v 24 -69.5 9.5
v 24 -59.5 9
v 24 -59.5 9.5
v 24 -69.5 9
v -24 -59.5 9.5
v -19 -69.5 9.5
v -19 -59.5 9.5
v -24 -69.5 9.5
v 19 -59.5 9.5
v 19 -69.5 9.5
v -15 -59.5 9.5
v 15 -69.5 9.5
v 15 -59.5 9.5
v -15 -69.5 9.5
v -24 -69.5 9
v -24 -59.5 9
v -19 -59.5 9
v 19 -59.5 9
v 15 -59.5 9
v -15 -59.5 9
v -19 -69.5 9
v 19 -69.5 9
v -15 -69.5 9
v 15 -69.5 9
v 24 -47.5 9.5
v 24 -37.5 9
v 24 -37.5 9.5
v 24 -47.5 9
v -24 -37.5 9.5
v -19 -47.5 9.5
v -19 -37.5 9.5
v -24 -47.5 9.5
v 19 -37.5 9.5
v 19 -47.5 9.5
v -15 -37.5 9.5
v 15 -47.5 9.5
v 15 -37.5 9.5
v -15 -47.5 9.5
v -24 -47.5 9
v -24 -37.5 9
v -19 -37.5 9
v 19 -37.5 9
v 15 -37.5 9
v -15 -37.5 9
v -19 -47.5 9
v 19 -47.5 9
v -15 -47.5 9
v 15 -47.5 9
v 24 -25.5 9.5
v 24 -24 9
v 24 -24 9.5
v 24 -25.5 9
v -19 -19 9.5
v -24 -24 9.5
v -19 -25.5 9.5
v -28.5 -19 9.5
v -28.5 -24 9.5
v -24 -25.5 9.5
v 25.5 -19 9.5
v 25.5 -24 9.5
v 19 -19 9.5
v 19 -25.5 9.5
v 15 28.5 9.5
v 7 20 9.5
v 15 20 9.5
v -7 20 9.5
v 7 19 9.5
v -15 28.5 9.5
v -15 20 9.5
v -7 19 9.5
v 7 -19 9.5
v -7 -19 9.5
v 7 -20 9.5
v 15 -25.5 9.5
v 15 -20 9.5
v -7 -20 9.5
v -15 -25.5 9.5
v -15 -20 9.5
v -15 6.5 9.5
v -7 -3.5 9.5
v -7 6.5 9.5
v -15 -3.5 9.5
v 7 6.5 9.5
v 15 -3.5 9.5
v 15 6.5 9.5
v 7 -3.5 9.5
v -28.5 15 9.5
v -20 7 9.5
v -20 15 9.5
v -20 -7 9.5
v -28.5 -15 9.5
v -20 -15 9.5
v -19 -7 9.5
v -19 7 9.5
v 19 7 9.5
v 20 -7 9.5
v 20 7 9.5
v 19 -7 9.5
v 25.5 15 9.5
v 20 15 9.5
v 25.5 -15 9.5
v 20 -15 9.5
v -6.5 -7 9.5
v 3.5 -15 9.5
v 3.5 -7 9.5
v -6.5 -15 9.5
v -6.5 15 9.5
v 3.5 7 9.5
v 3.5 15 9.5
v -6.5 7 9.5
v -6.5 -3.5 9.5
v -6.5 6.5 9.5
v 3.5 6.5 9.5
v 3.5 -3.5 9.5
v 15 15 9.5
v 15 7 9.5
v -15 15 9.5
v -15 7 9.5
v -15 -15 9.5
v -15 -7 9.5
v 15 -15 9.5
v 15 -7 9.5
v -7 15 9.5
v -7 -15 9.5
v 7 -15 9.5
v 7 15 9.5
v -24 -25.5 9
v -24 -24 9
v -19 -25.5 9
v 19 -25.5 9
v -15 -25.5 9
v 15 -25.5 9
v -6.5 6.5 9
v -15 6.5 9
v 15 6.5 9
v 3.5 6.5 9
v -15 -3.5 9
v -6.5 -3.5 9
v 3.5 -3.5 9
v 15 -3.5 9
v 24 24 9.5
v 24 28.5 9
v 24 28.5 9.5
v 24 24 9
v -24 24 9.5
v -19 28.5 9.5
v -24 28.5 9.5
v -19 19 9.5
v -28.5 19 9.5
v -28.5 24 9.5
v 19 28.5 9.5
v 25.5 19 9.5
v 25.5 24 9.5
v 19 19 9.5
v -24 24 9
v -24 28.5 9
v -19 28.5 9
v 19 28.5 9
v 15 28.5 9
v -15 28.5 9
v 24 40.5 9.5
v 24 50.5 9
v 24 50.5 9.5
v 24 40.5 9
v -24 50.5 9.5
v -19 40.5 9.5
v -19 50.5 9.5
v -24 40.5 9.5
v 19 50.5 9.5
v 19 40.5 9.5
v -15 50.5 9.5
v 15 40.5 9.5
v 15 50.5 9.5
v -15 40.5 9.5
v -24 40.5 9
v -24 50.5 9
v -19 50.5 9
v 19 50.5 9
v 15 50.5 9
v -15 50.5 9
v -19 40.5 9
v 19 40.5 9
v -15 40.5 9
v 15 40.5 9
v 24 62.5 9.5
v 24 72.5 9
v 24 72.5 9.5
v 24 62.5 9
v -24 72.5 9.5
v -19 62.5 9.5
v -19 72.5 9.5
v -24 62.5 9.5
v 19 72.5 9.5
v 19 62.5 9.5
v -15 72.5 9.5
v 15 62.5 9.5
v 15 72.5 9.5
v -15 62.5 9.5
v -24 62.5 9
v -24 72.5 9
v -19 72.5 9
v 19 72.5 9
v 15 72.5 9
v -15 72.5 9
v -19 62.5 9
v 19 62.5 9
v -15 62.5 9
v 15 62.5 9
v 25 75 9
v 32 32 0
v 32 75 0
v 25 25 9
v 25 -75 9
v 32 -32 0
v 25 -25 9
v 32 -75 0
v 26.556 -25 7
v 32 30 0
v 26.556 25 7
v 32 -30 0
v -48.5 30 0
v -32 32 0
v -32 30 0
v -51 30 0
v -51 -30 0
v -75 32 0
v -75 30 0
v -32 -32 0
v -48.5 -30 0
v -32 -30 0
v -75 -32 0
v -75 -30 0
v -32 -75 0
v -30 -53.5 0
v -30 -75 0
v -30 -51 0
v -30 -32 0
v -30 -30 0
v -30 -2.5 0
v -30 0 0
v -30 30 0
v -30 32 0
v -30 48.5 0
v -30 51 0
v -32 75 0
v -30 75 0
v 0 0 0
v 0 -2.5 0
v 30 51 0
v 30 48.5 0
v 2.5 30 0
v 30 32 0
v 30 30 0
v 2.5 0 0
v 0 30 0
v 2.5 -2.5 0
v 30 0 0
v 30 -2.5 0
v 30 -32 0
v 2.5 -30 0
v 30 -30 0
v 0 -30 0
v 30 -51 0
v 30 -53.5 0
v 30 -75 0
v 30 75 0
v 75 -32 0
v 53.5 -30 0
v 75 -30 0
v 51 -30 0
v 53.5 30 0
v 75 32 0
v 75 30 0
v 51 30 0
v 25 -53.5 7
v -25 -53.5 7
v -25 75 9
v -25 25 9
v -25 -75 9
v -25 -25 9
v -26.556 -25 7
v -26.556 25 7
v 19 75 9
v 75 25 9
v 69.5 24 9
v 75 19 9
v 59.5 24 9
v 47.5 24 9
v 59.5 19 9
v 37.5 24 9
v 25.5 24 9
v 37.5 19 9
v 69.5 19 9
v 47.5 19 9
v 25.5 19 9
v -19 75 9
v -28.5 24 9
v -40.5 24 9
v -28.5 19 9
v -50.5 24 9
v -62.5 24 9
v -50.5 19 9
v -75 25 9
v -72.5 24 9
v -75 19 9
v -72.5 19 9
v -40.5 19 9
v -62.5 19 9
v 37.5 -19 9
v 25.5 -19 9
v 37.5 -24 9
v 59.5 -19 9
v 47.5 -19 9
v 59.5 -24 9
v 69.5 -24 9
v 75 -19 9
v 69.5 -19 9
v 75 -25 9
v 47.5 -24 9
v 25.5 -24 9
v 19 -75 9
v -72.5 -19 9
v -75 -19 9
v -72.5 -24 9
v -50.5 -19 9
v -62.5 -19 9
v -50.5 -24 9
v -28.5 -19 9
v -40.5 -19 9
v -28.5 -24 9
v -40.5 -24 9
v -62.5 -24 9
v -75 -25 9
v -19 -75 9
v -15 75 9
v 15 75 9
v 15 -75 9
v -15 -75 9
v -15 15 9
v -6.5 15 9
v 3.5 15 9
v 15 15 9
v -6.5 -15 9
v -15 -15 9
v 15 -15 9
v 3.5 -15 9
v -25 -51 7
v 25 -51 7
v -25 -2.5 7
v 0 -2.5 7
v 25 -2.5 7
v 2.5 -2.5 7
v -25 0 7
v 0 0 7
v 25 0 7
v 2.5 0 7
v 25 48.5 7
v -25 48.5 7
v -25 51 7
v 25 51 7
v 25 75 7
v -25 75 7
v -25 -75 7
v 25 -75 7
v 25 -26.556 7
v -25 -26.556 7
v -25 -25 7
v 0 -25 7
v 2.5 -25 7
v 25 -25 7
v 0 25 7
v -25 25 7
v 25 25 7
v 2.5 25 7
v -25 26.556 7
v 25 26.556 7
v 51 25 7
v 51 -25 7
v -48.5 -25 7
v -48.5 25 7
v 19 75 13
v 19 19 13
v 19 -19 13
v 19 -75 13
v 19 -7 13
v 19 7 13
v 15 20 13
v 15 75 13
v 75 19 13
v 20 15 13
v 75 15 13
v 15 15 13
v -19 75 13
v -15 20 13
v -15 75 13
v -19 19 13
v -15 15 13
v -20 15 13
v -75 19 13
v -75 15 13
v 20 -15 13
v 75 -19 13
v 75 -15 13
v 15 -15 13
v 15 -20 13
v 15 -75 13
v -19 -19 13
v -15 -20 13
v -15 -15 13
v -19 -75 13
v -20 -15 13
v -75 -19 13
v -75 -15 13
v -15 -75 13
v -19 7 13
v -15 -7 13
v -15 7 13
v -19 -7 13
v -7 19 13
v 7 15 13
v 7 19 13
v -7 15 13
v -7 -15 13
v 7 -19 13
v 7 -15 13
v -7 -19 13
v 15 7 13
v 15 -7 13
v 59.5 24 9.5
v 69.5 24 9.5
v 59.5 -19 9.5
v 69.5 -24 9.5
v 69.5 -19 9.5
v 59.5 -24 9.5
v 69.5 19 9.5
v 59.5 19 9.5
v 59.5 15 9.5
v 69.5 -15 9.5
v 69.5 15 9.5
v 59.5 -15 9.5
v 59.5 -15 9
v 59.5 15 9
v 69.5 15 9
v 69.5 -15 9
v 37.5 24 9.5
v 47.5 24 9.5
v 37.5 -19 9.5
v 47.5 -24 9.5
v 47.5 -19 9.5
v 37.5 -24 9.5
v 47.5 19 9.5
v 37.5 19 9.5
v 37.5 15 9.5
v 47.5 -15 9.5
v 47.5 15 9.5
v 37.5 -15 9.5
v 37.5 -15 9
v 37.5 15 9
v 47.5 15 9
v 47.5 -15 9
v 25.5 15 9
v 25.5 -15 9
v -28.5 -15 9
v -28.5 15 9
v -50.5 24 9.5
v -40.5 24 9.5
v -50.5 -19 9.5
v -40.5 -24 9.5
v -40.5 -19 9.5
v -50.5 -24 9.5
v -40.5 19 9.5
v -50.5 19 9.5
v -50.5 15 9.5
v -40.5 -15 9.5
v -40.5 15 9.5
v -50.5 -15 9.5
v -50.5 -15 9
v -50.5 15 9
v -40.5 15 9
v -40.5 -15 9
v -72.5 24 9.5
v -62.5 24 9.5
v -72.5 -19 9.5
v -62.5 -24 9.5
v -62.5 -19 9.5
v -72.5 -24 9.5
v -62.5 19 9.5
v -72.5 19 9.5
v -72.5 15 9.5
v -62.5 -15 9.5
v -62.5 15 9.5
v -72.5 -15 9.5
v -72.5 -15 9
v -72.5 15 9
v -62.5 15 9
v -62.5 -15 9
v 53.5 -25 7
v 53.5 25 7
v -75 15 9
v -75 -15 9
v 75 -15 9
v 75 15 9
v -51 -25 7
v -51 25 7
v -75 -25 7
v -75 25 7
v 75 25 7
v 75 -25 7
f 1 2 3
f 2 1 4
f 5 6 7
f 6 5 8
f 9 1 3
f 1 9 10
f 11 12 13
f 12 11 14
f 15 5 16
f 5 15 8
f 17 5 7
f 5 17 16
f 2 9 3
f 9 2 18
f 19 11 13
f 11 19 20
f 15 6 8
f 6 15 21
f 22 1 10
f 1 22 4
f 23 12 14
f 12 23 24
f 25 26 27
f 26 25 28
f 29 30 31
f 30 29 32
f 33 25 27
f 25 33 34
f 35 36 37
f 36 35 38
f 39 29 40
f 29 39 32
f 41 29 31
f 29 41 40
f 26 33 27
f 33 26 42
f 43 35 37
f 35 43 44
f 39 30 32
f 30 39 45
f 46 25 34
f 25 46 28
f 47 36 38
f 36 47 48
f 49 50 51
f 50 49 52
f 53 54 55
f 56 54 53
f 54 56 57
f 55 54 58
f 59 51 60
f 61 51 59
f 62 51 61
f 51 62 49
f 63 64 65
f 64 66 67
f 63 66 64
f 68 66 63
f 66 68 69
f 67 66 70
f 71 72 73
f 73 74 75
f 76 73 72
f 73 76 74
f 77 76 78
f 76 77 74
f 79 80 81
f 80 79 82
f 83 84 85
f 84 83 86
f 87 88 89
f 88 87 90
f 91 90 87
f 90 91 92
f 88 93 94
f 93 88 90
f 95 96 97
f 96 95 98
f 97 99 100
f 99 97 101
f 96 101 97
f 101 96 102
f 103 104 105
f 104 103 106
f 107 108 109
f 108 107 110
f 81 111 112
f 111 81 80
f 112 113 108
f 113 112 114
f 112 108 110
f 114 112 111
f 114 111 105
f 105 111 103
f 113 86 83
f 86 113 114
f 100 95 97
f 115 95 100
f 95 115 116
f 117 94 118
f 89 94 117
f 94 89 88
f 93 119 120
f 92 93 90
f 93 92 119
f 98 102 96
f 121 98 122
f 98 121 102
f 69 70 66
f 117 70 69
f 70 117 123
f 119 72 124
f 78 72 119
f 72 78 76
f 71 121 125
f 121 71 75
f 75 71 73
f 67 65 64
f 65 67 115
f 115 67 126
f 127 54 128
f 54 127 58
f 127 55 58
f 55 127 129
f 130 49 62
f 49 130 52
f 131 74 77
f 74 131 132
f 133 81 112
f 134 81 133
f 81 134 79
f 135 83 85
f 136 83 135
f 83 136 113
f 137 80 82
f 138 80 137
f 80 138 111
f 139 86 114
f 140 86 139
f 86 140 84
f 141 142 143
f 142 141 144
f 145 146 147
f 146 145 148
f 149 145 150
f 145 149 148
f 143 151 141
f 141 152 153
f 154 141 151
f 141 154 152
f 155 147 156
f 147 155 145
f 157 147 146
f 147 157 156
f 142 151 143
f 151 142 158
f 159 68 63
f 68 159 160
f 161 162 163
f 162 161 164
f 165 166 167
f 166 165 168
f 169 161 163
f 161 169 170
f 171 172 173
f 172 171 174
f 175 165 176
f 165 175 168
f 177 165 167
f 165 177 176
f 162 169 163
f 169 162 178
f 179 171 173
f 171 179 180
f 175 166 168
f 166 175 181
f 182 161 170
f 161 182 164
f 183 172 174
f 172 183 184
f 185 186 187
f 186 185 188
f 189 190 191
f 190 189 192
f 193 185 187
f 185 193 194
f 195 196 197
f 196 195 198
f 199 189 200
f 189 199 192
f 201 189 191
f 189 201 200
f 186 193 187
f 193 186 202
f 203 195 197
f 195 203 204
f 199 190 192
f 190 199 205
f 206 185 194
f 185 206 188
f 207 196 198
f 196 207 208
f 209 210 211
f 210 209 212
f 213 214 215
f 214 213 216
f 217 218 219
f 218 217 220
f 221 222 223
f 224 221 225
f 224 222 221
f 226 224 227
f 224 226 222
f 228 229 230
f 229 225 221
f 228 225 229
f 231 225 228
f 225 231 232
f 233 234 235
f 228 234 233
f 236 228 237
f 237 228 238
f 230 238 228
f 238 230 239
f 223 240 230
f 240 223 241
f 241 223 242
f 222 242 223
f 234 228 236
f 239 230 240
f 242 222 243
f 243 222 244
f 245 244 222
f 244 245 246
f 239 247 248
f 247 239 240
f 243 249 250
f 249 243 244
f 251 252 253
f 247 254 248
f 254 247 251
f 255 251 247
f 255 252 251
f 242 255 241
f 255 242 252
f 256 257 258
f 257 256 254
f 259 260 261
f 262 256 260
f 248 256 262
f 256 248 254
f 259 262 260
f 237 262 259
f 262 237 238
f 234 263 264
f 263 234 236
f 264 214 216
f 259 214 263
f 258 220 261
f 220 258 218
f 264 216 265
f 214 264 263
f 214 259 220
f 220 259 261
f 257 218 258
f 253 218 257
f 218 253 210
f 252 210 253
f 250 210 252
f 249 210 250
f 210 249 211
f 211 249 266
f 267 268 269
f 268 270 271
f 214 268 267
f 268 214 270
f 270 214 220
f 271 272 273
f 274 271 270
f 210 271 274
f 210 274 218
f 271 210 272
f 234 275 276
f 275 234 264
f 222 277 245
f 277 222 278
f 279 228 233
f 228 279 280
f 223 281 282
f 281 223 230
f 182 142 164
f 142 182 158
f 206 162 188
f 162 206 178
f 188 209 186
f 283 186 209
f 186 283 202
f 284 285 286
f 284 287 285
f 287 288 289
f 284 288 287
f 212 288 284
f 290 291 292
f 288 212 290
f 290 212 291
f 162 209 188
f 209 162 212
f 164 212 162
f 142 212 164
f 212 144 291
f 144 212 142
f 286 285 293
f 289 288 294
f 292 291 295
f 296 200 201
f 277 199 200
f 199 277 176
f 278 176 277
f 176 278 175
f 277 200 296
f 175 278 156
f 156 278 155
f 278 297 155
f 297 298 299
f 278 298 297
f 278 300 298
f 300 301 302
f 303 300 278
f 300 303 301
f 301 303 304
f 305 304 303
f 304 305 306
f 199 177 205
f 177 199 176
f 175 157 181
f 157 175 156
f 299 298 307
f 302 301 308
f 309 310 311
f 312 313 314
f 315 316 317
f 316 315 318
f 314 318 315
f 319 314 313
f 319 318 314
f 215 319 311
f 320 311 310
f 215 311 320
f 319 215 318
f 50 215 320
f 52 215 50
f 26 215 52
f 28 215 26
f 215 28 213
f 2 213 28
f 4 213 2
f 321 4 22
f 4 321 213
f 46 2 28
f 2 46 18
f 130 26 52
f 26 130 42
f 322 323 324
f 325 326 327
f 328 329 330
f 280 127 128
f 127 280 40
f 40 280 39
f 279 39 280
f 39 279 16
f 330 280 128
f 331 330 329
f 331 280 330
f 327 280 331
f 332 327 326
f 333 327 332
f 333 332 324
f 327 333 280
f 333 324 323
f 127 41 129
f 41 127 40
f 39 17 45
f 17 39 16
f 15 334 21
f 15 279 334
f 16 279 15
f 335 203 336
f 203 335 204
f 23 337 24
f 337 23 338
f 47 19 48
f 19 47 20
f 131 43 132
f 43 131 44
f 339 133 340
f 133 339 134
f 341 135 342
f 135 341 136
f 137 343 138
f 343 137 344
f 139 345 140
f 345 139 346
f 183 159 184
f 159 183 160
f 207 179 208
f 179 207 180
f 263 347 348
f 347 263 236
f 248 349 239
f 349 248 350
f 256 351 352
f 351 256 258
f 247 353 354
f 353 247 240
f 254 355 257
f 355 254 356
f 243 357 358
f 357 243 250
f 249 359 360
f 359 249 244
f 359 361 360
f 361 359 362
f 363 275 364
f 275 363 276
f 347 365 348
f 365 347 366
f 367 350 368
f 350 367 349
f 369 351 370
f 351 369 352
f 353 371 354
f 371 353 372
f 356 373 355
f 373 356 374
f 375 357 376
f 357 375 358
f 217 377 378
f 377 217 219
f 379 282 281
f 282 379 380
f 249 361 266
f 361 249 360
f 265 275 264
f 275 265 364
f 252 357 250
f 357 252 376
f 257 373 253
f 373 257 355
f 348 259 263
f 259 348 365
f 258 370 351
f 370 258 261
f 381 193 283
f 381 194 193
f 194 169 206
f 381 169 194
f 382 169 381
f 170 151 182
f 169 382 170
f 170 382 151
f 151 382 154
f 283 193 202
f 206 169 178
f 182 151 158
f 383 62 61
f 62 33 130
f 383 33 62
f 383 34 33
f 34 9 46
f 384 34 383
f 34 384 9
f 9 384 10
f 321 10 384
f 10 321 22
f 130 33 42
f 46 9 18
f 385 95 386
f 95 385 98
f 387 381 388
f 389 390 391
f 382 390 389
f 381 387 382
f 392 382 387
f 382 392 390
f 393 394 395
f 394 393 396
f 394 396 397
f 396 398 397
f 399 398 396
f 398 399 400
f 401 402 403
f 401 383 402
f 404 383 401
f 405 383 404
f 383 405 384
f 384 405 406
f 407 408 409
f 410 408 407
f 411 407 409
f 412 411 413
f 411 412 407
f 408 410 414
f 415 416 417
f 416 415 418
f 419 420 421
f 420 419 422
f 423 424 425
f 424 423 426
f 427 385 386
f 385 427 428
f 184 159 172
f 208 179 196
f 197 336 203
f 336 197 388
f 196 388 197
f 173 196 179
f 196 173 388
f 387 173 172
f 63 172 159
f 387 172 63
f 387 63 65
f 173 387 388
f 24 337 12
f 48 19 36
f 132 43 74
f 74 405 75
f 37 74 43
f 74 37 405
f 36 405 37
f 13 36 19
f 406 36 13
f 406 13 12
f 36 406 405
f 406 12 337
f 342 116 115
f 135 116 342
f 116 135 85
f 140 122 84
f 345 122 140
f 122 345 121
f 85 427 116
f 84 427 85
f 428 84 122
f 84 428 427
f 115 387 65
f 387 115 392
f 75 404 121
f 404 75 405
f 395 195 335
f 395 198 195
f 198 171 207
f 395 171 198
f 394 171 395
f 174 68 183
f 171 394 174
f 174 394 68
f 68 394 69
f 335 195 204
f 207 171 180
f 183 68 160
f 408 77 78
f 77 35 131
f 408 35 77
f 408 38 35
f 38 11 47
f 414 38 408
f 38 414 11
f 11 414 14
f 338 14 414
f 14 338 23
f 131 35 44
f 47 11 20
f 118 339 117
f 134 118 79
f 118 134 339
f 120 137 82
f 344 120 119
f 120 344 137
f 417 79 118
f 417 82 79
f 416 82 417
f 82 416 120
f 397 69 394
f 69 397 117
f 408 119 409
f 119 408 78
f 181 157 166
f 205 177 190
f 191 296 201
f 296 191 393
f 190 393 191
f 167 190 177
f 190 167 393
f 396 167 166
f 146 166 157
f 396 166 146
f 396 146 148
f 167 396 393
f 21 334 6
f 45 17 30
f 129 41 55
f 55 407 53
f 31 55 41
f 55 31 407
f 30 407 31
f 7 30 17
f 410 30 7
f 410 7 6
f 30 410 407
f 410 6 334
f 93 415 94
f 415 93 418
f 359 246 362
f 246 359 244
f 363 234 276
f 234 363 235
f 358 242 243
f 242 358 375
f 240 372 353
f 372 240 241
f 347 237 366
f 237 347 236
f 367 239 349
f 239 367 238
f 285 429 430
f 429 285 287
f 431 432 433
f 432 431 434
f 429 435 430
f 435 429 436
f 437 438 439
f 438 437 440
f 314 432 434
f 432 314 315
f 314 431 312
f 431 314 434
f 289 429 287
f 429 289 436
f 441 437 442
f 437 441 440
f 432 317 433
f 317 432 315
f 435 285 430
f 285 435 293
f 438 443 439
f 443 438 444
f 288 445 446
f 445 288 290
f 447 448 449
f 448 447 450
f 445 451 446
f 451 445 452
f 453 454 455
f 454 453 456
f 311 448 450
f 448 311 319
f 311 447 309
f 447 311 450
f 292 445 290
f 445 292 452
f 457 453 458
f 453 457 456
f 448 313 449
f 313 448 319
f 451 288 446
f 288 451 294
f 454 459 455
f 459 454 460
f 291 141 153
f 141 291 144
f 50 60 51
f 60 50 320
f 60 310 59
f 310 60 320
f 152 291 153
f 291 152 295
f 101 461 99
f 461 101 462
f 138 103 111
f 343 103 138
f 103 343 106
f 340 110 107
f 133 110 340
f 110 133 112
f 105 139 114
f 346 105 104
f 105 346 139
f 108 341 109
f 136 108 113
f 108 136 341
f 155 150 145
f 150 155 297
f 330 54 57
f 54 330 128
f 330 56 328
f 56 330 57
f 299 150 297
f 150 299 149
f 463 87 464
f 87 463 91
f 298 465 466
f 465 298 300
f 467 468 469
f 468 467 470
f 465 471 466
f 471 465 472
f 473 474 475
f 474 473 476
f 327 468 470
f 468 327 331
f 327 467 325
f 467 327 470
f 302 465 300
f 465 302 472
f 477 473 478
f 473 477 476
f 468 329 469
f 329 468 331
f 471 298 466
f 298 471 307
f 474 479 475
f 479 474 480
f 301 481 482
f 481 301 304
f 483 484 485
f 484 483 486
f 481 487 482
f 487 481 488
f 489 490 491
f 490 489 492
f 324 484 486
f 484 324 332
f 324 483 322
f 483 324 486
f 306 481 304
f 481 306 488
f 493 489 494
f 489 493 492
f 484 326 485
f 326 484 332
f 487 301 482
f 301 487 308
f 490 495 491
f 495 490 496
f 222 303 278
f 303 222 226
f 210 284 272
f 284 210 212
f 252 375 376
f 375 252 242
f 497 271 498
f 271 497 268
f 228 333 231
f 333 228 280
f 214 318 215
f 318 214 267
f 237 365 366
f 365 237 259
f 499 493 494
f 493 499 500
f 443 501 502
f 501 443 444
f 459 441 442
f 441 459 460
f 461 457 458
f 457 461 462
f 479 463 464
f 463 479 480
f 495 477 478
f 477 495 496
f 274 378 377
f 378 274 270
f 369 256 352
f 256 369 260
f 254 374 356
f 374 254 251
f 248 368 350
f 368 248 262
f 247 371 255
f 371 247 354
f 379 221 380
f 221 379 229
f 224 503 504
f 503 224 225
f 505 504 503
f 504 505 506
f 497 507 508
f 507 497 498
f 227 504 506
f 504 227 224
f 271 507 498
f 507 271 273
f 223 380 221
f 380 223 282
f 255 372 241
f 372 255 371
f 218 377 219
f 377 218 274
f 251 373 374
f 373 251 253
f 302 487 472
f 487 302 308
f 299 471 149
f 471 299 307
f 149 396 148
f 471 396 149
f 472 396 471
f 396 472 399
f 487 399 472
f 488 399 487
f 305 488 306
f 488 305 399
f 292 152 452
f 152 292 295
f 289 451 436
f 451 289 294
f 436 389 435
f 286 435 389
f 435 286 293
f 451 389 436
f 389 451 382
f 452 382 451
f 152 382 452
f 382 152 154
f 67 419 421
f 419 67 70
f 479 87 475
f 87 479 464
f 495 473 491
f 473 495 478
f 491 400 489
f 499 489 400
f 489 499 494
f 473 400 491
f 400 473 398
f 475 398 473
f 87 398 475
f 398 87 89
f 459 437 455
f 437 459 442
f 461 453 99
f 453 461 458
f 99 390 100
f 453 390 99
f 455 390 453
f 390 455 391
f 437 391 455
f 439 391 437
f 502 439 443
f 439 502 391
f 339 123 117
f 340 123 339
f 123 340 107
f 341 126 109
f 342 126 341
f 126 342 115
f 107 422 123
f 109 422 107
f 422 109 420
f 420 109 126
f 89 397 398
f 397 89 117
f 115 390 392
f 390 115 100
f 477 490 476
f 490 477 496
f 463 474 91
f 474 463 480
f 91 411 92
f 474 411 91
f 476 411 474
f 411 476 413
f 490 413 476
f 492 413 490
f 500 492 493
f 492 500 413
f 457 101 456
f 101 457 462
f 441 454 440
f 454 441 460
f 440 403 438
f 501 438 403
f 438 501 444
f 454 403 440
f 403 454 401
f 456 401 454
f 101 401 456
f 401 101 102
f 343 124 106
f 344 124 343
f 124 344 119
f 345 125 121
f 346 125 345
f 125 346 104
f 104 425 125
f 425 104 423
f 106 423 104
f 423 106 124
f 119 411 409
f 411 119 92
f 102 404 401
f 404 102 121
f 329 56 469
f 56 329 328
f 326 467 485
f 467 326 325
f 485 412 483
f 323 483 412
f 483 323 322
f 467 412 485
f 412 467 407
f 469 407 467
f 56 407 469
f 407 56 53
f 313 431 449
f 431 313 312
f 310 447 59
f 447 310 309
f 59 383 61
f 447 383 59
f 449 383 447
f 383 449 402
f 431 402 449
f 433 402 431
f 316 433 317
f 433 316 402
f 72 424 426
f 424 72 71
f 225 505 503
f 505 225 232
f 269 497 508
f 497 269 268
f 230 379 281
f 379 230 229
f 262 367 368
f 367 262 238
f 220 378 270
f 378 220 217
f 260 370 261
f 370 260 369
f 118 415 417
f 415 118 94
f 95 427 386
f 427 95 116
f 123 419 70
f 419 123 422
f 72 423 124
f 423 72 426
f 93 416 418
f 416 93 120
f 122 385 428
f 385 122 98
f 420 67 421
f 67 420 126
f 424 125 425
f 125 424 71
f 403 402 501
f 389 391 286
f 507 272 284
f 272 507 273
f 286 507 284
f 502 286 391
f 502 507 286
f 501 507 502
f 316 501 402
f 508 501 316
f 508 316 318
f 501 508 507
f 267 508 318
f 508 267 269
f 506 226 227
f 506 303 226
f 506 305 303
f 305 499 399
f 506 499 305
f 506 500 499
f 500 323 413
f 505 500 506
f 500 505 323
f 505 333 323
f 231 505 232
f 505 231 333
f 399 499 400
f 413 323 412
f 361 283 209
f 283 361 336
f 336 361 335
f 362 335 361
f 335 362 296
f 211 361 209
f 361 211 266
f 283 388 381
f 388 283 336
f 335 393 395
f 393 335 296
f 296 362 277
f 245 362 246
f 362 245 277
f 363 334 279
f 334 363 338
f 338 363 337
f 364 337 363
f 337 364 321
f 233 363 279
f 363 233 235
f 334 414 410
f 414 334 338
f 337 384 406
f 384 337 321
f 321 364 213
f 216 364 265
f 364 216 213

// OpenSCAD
//
// Crossing track, made to be compatible with Geotrax®
// (Work in progress : no join system between tracks)
// Author: Francois Crevola (francois@crevola.org)
//

// Try d = 0 for a more "geotraxed" version
// Try d = -7 for a simplified, more 3D printer frendly version

d = 0;

intersection() {
  translate([0,0,10]) cube(size=[150,150,20],center=true);
  translate([0,0,d]) crossingTrack();
}

module crossingTrack() {
  difference() {
    union() {
      rotate([0,0,0])	  longTrack();
      rotate([0,0,90]) longTrack();
    }

    for (i = [0,90,180,270]) {
	  rotate([0,0,i]) translate([0, 11, 11.5]) cube(size = [40,8,4], center = true);
    }
  }
}

module longTrack() {

long = 153;

// main piece
	rotate([90,0,0])
	translate([0, 0, -long/2]) // center
	linear_extrude(height=long)
		polygon(points=[[0,7],[-25,7],[-30,0],[-32,0],[-25,9],[-19,9],[-19,13],[-15,13],[-15,9],[15,9],[15,13],[19,13],[19,9],[25,9],[32,0],[30,0],[25,7]], paths=[[0,1,2,3,4,5,6,7,8,9,10,11,12,13,14,15,16,17,18,19,20]]);


// + traverses
spacing = 22;
max = 7;
delta = 10;
for (i = [1:max]) // n iterations
{
	translate([0,-long/2+(i*spacing)-delta,9])
	cube(size = [48, 10, 1], center = true);
}

// + supports
for (i = [-1, 0, 1]) {
	translate([0,i*(long/3),0])
	rotate([90,0,0])
	linear_extrude(height=2.5)
		polygon(points=[[-32,0],[-25,9],[25,9],[32,0]], paths=[[0,1,2,3,4,5,6,7,8,9,10,11,12,13,14,15,16,17,18,19,20]]);
}

}
